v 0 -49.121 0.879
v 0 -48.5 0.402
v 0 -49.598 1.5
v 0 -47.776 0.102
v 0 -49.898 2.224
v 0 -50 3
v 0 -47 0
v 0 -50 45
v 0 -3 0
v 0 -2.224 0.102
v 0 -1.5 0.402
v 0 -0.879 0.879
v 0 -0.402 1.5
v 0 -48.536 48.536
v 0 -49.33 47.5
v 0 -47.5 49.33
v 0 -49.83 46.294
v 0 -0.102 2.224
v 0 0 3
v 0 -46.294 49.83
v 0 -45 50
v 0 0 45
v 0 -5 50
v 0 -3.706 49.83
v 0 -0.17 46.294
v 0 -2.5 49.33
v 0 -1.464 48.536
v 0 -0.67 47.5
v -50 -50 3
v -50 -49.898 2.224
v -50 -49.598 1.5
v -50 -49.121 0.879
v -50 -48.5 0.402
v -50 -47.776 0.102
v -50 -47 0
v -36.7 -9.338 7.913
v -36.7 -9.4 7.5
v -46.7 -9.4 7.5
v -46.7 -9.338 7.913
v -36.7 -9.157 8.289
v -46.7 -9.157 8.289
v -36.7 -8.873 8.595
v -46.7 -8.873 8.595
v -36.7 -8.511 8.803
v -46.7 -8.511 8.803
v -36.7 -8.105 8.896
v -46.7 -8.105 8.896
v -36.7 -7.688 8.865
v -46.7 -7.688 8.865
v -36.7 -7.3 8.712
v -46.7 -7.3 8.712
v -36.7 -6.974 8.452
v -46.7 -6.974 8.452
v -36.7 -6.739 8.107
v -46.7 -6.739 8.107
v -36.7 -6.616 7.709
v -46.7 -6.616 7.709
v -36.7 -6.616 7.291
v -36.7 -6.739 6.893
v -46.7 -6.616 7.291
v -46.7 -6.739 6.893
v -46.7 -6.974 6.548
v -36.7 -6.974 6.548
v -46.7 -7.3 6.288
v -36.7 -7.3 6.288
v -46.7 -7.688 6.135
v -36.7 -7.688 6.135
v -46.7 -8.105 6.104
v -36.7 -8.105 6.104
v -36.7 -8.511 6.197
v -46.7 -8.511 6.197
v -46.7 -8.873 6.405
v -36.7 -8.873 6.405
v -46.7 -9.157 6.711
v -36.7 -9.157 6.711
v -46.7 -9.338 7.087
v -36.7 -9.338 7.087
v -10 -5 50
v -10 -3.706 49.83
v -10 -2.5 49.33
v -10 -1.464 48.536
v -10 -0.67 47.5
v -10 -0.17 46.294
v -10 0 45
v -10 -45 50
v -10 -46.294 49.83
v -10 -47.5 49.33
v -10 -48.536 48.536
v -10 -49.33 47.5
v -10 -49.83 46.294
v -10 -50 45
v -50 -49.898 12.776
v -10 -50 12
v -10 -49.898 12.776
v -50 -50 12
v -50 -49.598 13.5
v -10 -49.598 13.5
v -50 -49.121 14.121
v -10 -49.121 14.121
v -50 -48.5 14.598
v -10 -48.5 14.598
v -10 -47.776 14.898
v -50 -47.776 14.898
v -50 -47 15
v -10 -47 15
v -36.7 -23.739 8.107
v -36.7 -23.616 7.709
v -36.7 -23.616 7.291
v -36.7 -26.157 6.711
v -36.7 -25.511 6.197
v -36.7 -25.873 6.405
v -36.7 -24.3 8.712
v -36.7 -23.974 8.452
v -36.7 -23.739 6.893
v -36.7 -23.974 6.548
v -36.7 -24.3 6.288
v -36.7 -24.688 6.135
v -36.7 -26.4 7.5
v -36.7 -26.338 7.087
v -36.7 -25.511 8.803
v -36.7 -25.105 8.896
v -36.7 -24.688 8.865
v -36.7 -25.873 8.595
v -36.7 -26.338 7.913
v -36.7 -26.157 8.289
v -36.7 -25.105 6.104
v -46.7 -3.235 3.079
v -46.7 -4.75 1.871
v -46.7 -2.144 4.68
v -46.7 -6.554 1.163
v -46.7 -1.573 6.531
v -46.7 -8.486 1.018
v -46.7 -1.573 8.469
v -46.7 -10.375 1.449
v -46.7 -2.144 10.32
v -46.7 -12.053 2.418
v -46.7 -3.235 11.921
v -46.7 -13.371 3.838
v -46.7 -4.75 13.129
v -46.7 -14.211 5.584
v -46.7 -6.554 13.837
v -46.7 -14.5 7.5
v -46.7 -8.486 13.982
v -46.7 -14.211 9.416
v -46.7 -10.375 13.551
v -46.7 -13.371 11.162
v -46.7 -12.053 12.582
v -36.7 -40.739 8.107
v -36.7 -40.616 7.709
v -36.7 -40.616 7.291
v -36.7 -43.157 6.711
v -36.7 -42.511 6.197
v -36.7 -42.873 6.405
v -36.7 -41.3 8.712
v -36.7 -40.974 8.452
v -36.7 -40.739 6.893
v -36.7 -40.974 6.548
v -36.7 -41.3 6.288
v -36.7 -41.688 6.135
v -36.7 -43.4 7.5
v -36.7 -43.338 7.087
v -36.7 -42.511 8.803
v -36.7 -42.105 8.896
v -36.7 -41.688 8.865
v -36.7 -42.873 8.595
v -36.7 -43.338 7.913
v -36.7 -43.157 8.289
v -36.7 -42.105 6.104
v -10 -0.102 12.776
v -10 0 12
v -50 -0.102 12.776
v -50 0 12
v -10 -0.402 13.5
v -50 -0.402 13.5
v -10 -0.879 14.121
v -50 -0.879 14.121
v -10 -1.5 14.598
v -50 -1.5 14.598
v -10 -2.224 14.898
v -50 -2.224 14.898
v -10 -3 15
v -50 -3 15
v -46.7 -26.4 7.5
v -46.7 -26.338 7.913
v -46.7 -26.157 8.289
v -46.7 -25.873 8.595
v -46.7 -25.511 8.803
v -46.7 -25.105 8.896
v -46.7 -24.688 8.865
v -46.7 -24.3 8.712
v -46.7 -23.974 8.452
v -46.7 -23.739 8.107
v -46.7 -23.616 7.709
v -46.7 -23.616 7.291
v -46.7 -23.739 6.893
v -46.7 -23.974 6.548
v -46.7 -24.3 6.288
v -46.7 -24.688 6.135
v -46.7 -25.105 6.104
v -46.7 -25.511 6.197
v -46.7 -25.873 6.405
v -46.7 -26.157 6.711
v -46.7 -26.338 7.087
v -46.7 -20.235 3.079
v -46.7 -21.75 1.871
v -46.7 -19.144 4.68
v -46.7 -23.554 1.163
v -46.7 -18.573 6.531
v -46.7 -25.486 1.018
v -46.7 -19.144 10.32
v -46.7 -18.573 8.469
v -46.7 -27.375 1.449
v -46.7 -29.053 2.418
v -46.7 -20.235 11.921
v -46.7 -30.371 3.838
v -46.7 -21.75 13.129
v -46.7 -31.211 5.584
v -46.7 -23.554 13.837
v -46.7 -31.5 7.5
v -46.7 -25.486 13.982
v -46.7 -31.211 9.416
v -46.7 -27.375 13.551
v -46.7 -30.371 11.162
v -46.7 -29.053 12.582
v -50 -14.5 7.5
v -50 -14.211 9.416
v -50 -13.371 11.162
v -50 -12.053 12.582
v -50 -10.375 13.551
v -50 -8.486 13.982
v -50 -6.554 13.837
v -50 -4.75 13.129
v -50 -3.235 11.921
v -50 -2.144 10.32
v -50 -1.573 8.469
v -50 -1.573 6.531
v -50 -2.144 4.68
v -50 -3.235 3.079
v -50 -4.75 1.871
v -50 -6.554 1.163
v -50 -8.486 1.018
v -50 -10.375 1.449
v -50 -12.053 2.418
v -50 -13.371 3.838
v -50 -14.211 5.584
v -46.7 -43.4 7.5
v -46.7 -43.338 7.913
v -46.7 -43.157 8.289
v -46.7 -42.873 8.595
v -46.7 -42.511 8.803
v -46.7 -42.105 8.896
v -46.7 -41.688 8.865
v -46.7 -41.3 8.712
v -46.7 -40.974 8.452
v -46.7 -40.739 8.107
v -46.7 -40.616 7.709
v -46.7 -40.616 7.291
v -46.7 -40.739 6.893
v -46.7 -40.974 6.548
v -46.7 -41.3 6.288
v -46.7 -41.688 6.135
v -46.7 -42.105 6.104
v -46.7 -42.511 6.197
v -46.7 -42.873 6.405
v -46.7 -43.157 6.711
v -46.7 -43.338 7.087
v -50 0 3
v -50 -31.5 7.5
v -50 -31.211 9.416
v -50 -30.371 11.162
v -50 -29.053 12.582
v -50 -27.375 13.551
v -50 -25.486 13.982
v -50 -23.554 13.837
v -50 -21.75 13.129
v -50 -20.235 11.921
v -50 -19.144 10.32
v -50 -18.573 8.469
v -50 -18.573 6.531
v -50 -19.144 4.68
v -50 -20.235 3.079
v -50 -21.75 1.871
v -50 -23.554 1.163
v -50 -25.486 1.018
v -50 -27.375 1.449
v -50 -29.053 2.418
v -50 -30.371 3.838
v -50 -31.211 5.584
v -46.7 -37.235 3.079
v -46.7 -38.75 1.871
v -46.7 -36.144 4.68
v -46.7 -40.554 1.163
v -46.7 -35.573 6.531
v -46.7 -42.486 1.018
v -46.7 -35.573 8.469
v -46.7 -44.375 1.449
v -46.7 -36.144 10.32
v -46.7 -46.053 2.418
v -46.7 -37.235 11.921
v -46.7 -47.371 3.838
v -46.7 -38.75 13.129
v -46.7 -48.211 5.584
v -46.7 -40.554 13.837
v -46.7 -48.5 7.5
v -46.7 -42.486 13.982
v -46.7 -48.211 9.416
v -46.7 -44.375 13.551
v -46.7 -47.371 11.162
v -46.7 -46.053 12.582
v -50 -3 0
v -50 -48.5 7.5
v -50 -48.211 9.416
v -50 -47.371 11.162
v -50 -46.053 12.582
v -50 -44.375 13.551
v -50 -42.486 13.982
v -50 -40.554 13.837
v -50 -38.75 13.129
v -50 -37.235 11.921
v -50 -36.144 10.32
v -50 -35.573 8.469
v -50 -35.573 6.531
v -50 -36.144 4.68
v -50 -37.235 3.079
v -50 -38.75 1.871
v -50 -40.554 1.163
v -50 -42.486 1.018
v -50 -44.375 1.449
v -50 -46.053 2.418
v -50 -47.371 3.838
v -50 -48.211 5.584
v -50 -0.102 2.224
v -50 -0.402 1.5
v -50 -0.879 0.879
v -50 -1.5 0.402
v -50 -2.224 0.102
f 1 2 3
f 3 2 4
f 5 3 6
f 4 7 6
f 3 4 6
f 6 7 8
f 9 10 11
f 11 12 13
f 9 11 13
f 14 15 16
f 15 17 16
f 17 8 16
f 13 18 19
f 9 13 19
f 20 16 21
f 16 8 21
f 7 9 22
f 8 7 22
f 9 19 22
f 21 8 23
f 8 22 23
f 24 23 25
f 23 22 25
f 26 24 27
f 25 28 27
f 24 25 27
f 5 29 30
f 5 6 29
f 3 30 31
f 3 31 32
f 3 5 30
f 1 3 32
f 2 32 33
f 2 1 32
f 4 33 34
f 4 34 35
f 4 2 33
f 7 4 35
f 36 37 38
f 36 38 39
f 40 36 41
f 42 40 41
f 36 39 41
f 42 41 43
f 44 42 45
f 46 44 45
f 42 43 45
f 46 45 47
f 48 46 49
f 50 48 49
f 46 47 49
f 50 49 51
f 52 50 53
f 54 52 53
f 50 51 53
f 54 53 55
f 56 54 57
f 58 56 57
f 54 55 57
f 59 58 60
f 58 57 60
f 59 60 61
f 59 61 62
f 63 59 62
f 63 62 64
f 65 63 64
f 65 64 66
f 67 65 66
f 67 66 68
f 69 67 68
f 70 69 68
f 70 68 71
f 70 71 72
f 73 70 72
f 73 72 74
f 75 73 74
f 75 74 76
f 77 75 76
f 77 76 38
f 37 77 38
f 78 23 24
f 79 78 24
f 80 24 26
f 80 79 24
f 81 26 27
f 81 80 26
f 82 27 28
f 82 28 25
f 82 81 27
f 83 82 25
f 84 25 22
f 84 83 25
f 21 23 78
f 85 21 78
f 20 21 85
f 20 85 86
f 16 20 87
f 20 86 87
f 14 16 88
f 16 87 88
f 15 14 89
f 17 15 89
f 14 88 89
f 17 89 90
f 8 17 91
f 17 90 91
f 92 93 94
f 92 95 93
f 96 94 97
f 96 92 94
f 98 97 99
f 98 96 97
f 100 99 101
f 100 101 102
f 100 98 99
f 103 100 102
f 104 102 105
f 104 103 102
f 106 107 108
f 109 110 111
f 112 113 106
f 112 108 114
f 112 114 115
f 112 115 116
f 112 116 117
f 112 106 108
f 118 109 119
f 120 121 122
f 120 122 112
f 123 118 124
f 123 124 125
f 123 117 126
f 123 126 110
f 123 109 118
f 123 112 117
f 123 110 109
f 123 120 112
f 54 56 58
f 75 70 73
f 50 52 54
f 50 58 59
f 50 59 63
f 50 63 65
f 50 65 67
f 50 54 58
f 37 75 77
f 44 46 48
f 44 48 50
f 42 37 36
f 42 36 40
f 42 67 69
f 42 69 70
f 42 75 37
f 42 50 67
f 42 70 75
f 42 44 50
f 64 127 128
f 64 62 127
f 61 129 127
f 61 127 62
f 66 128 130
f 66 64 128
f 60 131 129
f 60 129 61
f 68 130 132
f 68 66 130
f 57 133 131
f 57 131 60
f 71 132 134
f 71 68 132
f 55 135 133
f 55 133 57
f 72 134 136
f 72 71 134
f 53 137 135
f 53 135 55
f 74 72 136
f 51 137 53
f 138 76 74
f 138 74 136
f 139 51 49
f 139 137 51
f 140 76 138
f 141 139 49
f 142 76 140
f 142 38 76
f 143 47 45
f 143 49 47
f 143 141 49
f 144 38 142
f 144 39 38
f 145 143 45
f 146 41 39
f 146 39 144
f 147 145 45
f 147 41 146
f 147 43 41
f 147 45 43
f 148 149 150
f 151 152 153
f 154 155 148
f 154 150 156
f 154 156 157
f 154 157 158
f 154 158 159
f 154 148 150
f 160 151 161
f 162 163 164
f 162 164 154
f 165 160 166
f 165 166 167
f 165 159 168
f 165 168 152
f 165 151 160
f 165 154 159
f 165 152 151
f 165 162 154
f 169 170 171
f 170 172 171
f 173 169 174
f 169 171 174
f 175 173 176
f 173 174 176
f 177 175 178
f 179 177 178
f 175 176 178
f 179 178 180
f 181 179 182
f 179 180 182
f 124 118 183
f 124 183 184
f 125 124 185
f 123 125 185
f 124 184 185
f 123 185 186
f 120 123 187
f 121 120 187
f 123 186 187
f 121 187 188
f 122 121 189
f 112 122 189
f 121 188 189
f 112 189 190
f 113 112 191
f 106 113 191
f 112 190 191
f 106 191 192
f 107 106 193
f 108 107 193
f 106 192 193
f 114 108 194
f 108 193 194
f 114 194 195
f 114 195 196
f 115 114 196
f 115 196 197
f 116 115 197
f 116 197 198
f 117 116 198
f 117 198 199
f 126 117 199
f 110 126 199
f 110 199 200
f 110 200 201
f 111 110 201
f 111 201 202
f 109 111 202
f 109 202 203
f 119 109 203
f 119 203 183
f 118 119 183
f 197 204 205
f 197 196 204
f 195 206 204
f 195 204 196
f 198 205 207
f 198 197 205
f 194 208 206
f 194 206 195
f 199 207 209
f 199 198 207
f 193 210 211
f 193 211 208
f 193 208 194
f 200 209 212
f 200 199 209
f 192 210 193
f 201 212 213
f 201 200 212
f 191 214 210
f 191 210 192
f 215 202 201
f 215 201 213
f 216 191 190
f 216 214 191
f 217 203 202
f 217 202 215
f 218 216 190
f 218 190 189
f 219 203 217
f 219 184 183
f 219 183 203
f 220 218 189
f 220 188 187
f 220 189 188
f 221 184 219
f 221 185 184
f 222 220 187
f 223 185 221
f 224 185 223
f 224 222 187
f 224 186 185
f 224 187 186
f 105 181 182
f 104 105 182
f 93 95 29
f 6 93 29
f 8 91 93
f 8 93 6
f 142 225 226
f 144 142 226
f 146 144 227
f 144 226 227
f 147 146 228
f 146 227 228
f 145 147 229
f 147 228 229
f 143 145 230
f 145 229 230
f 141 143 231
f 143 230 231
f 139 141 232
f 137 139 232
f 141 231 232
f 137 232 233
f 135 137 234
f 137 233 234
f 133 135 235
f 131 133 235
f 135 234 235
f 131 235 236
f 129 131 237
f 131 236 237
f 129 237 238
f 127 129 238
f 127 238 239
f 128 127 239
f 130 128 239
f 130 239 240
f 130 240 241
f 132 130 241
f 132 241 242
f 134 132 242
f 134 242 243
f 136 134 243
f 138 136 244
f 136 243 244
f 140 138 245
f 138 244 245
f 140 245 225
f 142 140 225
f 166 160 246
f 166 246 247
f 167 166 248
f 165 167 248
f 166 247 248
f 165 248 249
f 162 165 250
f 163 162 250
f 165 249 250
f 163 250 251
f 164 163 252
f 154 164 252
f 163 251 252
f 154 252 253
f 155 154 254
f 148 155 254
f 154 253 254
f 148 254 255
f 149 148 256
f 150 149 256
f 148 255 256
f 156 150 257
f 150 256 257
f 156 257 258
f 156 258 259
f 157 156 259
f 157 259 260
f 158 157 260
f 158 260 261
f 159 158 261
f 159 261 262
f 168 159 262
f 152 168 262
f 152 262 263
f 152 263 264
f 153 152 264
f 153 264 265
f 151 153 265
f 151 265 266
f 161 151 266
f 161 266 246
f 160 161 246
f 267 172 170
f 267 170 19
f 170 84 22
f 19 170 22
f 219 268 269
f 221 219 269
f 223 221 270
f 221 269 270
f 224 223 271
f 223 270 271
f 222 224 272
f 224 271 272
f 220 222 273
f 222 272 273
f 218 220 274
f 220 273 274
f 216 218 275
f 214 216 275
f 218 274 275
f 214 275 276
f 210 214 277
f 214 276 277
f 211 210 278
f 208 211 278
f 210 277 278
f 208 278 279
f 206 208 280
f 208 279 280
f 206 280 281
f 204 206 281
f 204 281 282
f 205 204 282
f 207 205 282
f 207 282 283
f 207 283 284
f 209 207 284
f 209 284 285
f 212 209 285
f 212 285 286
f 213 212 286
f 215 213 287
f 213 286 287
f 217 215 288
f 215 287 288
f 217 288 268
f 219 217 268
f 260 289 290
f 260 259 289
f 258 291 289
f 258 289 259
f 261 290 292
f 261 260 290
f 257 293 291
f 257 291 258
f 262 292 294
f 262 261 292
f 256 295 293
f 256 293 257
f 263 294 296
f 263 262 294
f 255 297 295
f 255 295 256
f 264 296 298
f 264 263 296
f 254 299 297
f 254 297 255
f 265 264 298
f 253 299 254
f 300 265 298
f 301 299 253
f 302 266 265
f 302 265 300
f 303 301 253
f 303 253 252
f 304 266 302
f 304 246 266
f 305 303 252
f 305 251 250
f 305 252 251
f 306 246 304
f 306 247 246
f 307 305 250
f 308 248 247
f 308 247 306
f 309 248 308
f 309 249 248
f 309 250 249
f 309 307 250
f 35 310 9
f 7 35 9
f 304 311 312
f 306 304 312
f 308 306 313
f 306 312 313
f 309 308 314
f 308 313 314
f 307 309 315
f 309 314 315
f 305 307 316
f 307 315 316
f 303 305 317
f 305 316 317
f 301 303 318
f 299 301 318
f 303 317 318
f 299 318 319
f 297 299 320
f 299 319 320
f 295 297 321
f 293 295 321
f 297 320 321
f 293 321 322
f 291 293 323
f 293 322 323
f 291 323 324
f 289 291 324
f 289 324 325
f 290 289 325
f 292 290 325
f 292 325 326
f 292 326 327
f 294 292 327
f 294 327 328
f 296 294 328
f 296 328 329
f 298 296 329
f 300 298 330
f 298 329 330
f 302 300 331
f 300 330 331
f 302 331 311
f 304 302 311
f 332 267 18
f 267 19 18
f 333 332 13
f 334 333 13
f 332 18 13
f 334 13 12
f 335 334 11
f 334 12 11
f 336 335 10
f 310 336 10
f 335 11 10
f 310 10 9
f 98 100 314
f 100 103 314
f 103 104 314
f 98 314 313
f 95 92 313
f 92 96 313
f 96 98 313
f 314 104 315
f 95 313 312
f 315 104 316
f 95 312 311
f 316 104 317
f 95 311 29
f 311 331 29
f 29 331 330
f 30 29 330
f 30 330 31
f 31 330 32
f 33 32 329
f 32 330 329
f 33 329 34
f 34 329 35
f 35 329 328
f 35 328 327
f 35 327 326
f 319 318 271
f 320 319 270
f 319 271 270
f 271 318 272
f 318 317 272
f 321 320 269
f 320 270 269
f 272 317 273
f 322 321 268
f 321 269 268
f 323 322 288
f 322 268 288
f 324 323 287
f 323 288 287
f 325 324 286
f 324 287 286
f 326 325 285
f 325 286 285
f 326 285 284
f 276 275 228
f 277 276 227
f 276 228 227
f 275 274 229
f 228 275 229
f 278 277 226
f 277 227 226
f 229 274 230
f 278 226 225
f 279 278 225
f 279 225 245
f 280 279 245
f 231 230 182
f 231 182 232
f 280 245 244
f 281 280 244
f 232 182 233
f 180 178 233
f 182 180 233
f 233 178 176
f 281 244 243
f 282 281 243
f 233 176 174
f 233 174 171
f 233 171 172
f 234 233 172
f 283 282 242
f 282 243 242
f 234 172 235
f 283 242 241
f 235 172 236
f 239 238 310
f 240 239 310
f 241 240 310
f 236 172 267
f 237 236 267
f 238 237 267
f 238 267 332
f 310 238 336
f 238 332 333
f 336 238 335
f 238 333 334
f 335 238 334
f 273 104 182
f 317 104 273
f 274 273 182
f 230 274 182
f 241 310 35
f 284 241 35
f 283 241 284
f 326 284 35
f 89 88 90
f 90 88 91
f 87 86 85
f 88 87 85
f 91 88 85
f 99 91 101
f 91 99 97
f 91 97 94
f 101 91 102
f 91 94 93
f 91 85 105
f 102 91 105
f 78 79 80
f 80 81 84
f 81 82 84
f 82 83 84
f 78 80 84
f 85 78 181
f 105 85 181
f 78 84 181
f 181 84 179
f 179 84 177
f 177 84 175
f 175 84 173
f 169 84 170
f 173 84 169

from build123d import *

# Parameters (mm, degrees)
F1_DEPTH = 50
F2_R     = 5
F3_R     = 6.5
F3_R_2   = 1.4
F4_DEPTH = 3.3
F5_DEPTH = 13.3
F6_R     = 3


with BuildPart() as f1:
    # F0 (on Front) → F1 (new body)
    with BuildSketch(Plane.XZ):
        Polygon((-50, 15), (-50, 0), (0, 0), (0, 50), (-10, 50), (-10, 15), align=None)
    extrude(amount=F1_DEPTH)

    # F2
    f2_edges = [f1.edges().sort_by_distance(p)[0] for p in [
        (-5, -50, 50),
        (-5, 0, 50),
    ]]
    fillet(f2_edges, radius=F2_R)

    # F3 (on face) → F4 (cut)
    with BuildSketch(Plane(origin=(-50, 0, 0), x_dir=(0, -1, 0), z_dir=(-1, 0, 0))):
        with Locations((8, 7.5)):
            Circle(F3_R)
        with Locations((8, 7.5)):
            Circle(F3_R_2, mode=Mode.SUBTRACT)
        with Locations((25, 7.5)):
            Circle(F3_R)
        with Locations((25, 7.5)):
            Circle(F3_R_2, mode=Mode.SUBTRACT)
        with Locations((42, 7.5)):
            Circle(F3_R)
        with Locations((42, 7.5)):
            Circle(F3_R_2, mode=Mode.SUBTRACT)
        with Locations((8, 7.5)):
            Circle(F3_R_2)
        with Locations((25, 7.5)):
            Circle(F3_R_2)
        with Locations((42, 7.5)):
            Circle(F3_R_2)
    extrude(amount=-F4_DEPTH, mode=Mode.SUBTRACT)

    # F3 (on face) → F5 (cut)
    with BuildSketch(Plane(origin=(-50, 0, 0), x_dir=(0, -1, 0), z_dir=(-1, 0, 0))):
        with Locations((8, 7.5)):
            Circle(F3_R_2)
        with Locations((25, 7.5)):
            Circle(F3_R_2)
        with Locations((42, 7.5)):
            Circle(F3_R_2)
    extrude(amount=-F5_DEPTH, mode=Mode.SUBTRACT)

    # F6
    f6_edges = [f1.edges().sort_by_distance(p)[0] for p in [
        (-25, -50, 0),
        (-25, 0, 0),
        (-30, 0, 15),
        (-30, -50, 15),
    ]]
    fillet(f6_edges, radius=F6_R)


solid = f1.part
